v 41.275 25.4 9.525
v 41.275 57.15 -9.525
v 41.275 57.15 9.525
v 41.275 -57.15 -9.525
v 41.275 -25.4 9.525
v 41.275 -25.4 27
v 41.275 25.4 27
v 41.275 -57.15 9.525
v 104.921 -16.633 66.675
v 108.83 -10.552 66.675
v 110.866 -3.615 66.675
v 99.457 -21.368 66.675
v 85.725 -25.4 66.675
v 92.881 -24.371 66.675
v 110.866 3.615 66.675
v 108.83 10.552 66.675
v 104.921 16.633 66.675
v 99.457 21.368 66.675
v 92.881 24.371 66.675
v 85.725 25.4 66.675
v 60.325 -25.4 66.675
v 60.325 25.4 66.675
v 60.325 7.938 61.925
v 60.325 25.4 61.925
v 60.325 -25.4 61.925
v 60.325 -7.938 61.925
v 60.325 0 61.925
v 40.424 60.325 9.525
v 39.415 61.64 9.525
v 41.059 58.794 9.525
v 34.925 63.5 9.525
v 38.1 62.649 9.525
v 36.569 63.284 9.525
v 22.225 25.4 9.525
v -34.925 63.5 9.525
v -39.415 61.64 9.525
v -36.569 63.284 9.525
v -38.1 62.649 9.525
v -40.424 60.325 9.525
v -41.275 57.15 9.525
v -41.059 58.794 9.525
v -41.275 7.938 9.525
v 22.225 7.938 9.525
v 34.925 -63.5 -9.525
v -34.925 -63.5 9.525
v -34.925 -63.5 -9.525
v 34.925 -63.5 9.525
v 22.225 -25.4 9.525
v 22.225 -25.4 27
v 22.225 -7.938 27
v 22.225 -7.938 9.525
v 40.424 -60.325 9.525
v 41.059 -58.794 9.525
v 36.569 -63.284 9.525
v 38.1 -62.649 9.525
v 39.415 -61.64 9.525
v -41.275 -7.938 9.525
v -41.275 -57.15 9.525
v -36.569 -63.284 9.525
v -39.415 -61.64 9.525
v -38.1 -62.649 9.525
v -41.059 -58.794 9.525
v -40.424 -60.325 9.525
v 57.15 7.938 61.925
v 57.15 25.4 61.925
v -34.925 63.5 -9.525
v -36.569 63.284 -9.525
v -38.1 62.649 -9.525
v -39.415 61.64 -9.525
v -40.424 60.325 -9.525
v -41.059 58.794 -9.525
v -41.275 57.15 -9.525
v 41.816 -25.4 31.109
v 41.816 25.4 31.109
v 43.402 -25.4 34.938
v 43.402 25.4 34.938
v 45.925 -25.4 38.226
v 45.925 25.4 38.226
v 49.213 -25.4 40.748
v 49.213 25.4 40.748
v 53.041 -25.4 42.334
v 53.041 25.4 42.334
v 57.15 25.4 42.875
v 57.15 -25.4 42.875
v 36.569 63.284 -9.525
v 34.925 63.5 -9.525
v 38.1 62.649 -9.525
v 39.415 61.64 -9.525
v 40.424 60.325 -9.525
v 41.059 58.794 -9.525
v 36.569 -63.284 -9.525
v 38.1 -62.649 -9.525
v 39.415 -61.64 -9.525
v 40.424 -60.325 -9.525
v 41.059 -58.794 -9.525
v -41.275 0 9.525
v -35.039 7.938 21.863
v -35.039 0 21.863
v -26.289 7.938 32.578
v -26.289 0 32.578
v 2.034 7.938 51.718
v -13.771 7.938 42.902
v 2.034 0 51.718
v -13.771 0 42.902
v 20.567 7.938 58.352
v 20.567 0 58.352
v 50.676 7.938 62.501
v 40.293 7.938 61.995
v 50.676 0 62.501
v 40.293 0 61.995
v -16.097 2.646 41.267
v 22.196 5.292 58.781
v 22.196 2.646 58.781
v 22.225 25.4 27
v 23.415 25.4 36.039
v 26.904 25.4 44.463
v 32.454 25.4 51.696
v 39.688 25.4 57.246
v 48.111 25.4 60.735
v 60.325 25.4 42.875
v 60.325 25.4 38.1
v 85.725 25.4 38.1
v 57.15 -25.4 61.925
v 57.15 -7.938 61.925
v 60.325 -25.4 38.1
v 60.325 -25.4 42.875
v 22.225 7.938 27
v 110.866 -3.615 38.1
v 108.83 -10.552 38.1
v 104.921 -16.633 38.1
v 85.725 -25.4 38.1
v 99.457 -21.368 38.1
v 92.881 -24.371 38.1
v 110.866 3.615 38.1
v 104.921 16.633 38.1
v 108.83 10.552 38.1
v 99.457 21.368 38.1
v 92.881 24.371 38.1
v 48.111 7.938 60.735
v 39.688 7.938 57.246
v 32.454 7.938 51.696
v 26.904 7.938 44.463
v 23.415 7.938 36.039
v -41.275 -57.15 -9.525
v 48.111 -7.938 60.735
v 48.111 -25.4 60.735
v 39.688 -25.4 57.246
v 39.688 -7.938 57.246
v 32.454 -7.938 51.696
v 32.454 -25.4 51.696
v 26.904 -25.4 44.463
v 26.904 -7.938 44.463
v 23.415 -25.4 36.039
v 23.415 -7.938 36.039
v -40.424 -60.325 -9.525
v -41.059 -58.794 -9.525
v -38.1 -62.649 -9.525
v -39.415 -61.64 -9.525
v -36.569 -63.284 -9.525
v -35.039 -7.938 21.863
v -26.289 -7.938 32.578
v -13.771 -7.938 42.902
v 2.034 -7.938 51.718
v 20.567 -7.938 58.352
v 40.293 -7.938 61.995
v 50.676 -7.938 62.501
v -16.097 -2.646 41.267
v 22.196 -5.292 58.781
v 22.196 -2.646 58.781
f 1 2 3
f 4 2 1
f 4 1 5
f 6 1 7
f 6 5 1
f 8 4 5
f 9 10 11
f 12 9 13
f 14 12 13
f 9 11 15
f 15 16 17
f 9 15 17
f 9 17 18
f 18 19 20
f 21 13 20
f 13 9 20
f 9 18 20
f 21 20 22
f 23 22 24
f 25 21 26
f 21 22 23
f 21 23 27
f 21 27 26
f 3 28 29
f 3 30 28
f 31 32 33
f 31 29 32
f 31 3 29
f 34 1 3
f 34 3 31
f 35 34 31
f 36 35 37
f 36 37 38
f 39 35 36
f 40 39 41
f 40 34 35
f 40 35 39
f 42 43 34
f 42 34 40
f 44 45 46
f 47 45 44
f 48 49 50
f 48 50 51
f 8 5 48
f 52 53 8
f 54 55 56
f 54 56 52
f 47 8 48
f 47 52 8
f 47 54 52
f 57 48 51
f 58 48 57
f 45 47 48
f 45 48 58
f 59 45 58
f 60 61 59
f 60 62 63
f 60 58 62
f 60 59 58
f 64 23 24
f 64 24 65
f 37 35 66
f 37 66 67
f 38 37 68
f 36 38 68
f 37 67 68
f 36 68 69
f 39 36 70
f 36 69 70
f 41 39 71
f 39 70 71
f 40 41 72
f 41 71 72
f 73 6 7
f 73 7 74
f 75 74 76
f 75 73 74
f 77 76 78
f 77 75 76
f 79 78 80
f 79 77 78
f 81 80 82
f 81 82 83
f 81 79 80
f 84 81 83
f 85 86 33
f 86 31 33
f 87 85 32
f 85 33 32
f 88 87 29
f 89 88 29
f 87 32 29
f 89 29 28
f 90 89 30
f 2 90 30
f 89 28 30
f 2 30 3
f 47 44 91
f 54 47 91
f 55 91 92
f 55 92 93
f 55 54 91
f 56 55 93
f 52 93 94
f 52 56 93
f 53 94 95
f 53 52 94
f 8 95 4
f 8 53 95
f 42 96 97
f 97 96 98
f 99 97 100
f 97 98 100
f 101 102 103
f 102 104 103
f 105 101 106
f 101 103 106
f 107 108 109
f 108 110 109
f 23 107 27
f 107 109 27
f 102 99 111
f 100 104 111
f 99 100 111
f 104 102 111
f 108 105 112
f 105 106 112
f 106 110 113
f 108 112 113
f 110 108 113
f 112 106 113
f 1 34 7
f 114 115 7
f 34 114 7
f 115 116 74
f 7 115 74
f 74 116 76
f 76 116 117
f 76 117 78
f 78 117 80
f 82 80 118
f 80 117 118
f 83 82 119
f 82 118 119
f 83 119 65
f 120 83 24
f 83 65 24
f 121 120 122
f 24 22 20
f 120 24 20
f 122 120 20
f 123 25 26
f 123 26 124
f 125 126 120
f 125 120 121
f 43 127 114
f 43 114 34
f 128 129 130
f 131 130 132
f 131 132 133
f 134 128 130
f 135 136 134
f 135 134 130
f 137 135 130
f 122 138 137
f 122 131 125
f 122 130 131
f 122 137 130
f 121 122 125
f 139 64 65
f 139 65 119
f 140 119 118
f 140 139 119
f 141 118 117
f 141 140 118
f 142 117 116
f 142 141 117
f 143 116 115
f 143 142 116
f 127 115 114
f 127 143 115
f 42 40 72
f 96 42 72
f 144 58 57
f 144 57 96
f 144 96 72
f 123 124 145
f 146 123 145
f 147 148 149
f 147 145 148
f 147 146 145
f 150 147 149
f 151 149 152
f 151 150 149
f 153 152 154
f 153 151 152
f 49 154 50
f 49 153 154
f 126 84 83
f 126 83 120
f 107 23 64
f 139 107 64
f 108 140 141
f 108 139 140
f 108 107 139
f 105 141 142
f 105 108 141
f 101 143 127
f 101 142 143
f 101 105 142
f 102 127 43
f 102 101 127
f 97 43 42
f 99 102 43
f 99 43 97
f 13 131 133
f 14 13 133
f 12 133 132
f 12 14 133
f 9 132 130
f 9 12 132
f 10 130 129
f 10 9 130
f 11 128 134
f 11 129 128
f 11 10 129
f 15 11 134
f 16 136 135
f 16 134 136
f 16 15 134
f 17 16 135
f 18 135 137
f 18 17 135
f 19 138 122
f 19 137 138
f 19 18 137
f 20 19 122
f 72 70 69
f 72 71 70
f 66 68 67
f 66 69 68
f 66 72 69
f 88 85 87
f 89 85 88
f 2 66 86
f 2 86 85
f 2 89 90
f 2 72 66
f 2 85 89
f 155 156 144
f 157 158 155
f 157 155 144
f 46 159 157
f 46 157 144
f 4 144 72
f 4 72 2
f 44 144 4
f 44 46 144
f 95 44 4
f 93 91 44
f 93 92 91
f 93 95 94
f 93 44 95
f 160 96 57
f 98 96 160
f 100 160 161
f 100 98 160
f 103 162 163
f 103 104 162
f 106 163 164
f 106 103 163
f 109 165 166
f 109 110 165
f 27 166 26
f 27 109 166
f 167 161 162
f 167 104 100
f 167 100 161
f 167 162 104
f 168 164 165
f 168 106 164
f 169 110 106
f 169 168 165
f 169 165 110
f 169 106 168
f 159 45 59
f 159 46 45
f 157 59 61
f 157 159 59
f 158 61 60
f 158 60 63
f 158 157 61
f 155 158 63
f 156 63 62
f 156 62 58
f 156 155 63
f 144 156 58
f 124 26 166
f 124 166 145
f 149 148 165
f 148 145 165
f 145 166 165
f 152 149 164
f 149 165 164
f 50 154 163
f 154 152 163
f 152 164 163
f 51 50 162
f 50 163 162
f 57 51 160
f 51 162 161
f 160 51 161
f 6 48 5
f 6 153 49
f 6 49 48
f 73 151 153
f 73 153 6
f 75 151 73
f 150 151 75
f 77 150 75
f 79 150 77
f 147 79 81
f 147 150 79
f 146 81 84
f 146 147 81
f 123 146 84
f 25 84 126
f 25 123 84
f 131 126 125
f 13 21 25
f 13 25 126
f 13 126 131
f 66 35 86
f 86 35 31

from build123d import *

# Parameters (mm, degrees)
F1_DEPTH = 63.5
F2_DEPTH = 25.4
F3_DEPTH = 7.9375
F0_W     = 25.4
F0_H     = 28.575
F5_R     = 6.35


with BuildPart() as f1:
    # F0 (on Front) → F1 (new body, symmetric)
    with BuildSketch(Plane.XZ):
        Polygon((-41.275, 9.525), (-41.275, -9.525), (41.275, -9.525), (41.275, 9.525), (22.225, 9.525), align=None)
    extrude(amount=F1_DEPTH, both=True)

    # F0 (on Front) → F2 (join, symmetric)
    with BuildSketch(Plane.XZ):
        with BuildLine():
            Line((22.225, 9.525), (41.275, 9.525))
            Line((41.275, 9.525), (41.275, 27.0002))
            ThreePointArc((41.275, 27.0002), (45.92468, 38.22552), (57.15, 42.8752))
            Line((57.15, 42.8752), (60.325, 42.8752))
            Line((60.325, 42.8752), (60.325, 61.9252))
            Line((60.325, 61.9252), (57.15, 61.9252))
            ThreePointArc((57.15, 61.9252), (32.454296, 51.695904), (22.225, 27.0002))
            Line((22.225, 27.0002), (22.225, 9.525))
        make_face()
        Polygon((60.325, 66.675), (60.325, 61.9252), (60.325, 42.8752), (60.325, 38.1), (85.725, 38.1), (85.725, 66.675), align=None)
    extrude(amount=F2_DEPTH, both=True)

    # F0 (on Front) → F3 (join, symmetric)
    with BuildSketch(Plane.XZ):
        with BuildLine():
            add(Edge.make_bspline(
                [(-41.275, 9.525), (-27.082177, 48.334144), (26.706019, 66.012785), (60.325, 61.9252)],
                knots=[0, 0, 0, 0, 114.316845, 114.316845, 114.316845, 114.316845], degree=3))
            Line((-41.275, 9.525), (22.225, 9.525))
            Line((22.225, 9.525), (22.225, 27.0002))
            ThreePointArc((22.225, 27.0002), (32.454296, 51.695904), (57.15, 61.9252))
            Line((57.15, 61.9252), (60.325, 61.9252))
        make_face()
    extrude(amount=F3_DEPTH, both=True)

    # F0 (on Front) → F4 (revolve)
    with BuildSketch(Plane.XZ):
        with Locations((98.425, 52.3875)):
            Rectangle(F0_W, F0_H)
    revolve(axis=Axis((85.725, 0, 52.3875), (0, 0, 1)))

    # F5
    f5_edges = [f1.edges().sort_by_distance(p)[0] for p in [
        (-41.275, -63.5, 0),
        (41.275, -63.5, 0),
        (41.275, 63.5, 0),
        (-41.275, 63.5, 0),
    ]]
    fillet(f5_edges, radius=F5_R)


solid = f1.part
